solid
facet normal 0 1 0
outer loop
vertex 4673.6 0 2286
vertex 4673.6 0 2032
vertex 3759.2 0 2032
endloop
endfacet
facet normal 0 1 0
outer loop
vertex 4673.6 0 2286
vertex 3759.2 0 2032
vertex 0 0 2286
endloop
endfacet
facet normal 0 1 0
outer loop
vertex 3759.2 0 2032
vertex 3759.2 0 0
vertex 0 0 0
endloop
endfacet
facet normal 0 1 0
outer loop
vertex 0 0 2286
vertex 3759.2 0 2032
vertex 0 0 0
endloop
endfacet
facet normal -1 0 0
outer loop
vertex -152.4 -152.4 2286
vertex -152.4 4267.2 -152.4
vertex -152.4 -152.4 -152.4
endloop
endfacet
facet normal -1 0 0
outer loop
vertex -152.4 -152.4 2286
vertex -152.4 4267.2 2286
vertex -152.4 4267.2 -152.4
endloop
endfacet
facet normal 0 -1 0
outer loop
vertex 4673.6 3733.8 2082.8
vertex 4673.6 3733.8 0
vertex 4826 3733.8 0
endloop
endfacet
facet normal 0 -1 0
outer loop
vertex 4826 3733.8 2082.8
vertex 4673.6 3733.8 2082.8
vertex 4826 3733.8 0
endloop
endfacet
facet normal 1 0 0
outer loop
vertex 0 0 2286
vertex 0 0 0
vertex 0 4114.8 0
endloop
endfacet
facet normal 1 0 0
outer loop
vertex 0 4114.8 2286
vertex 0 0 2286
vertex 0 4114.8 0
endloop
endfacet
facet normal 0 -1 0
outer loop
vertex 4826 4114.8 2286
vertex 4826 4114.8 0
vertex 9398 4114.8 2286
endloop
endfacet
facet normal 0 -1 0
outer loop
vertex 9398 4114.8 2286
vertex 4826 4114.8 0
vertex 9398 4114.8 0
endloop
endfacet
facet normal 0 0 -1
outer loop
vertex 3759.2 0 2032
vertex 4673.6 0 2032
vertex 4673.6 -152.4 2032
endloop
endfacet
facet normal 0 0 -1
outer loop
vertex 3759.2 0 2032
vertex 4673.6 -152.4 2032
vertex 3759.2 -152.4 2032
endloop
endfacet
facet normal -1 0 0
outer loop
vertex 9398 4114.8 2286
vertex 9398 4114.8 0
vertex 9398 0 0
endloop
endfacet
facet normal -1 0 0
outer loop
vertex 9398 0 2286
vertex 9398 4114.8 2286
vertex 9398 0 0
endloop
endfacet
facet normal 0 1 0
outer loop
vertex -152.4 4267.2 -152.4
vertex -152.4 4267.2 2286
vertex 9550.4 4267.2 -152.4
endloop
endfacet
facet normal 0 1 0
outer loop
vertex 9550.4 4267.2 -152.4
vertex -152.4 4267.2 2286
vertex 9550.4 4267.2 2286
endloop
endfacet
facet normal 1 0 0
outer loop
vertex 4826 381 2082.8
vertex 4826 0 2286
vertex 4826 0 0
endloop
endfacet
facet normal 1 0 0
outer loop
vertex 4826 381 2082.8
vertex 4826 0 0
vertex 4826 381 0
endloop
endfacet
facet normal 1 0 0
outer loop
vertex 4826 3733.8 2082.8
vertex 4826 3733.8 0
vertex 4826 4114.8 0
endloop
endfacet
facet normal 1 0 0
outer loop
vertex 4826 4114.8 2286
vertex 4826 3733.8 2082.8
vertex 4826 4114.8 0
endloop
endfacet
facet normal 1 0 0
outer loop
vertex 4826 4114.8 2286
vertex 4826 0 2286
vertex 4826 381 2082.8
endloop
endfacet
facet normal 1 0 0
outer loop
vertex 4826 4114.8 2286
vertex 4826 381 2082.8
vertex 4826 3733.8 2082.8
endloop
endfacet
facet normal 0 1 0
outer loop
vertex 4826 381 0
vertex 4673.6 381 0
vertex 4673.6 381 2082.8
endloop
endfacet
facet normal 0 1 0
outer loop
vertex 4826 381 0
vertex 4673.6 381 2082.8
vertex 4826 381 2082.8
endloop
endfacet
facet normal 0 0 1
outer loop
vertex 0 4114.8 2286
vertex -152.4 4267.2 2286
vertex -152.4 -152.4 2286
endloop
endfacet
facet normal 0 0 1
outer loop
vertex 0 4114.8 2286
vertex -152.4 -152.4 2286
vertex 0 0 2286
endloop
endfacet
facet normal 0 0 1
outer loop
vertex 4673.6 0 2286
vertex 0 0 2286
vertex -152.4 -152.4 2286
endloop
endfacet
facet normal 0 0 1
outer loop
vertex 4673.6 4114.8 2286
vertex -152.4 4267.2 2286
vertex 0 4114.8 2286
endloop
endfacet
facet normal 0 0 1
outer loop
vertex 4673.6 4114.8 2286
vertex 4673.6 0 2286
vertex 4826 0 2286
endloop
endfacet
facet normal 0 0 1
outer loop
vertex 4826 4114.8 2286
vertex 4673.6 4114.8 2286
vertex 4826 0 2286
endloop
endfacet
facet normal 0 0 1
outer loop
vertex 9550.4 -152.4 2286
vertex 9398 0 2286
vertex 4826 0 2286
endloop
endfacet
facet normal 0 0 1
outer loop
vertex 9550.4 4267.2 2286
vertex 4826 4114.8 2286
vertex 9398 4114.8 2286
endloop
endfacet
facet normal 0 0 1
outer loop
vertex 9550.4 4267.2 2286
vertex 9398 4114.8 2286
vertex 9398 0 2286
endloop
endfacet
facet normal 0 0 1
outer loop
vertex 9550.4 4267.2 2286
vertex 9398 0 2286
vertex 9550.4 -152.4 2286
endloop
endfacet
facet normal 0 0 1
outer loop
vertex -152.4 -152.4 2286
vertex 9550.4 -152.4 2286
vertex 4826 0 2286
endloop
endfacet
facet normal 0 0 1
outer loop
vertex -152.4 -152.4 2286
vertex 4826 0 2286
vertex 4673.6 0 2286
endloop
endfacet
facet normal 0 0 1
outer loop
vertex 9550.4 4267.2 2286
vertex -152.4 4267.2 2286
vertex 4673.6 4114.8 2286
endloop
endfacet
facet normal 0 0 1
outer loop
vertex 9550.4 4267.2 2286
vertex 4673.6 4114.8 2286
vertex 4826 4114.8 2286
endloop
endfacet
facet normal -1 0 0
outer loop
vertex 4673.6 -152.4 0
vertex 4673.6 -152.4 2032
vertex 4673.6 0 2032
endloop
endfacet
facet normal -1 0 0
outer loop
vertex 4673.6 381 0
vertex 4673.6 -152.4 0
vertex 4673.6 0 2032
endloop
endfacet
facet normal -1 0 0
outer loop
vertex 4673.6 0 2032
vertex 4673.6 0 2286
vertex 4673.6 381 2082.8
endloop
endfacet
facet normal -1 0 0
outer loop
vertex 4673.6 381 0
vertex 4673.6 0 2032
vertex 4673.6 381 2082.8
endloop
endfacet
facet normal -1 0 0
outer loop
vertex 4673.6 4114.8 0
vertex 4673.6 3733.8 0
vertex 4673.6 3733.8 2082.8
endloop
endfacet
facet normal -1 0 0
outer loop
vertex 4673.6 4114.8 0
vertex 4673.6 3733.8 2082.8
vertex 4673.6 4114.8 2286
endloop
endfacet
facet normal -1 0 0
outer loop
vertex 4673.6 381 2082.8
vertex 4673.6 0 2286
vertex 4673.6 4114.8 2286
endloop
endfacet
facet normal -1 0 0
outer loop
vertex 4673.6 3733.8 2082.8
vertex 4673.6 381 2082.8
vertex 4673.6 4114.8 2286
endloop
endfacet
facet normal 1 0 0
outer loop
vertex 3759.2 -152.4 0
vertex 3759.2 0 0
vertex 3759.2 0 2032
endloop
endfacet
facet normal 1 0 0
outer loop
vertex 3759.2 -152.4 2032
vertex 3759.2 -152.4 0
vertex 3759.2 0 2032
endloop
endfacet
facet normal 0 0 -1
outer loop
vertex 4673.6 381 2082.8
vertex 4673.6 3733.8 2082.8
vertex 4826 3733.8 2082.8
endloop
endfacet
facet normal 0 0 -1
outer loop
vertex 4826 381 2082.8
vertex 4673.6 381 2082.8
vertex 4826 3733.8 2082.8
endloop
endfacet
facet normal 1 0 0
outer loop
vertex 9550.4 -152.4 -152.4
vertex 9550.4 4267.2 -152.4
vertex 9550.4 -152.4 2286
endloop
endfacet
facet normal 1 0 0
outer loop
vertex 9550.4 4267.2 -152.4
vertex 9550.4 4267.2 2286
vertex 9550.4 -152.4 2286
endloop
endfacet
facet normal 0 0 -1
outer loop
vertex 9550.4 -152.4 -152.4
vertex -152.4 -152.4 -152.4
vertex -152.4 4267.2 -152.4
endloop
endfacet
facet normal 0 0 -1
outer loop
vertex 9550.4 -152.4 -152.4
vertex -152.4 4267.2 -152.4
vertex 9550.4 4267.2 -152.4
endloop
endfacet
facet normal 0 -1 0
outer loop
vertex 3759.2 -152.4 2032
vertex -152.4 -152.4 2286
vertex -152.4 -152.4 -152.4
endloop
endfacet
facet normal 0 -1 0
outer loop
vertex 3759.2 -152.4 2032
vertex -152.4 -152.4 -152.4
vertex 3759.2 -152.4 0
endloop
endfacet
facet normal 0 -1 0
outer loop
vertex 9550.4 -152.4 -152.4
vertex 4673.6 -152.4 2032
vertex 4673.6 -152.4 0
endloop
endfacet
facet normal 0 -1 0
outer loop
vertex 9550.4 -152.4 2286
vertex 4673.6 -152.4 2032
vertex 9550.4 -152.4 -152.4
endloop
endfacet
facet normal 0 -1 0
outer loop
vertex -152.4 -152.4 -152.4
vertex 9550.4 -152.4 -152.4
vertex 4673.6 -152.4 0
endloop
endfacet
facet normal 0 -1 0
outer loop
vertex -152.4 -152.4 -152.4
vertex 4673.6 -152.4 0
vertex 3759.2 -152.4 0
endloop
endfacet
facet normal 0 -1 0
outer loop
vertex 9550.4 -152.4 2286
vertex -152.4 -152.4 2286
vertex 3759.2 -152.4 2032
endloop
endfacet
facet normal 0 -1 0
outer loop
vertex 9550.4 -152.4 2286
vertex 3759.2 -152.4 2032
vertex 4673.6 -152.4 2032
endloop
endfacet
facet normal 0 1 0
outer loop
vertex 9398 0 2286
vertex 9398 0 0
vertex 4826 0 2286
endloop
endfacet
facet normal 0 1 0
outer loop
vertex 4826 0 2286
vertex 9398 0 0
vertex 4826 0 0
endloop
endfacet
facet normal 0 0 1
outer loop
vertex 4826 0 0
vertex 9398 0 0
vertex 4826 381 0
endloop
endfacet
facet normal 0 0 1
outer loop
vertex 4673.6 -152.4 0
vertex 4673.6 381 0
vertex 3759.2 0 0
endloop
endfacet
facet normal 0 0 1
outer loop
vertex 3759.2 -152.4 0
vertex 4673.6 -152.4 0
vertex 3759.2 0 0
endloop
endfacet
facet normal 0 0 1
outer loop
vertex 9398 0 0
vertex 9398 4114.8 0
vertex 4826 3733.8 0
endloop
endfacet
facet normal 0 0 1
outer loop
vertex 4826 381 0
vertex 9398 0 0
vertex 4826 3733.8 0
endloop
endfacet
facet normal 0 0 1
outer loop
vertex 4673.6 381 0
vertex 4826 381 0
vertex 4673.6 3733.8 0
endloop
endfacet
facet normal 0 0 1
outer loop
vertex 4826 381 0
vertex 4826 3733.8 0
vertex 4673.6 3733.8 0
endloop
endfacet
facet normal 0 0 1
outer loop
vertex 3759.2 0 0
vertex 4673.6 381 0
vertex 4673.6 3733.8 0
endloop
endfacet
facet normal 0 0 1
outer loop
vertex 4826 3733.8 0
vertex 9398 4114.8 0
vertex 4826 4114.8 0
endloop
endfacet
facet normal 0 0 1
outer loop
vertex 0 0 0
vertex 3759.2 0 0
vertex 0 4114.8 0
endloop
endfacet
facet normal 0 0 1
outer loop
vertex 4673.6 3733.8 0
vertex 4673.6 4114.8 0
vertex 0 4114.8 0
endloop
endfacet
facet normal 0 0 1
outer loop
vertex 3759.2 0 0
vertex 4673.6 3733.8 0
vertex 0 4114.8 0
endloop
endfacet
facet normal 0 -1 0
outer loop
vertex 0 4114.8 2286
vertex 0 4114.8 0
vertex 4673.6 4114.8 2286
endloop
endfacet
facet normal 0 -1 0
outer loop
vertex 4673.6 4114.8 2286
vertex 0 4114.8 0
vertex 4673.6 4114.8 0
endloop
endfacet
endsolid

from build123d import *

# Parameters (mm, degrees)
F0_W     = 9702.8
F0_H     = 4419.6
F0_W_2   = 152.4
F0_H_2   = 381
F1_DEPTH = 2286
F2_W     = 9702.8
F2_H     = 4419.6
F3_DEPTH = 152.4
F4_W     = 914.4
F4_H     = 2032
F5_DEPTH = 152.401
F6_W     = 152.4
F6_H     = 3352.8
F7_DEPTH = 203.2


with BuildPart() as f1:
    # F0 (on Top) → F1 (new body)
    with BuildSketch(Plane.XY):
        with Locations((4699, 2057.4)):
            Rectangle(F0_W, F0_H)
        Polygon((4673.6, 0), (0, 0), (0, 4114.8), (4673.6, 4114.8), (4826, 4114.8), (9398, 4114.8), (9398, 0), (4826, 0), align=None, mode=Mode.SUBTRACT)
        with Locations((4749.8, 3924.3)):
            Rectangle(F0_W_2, F0_H_2)
        with Locations((4749.8, 190.5)):
            Rectangle(F0_W_2, F0_H_2)
    extrude(amount=F1_DEPTH)

    # F2 (on face) → F3 (join)
    with BuildSketch(Plane(origin=(0, 0, 0), x_dir=(1, 0, 0), z_dir=(0, 0, -1))):
        with Locations((4699, -2057.4)):
            Rectangle(F2_W, F2_H)
    extrude(amount=F3_DEPTH)

    # F4 (on face) → F5 (cut, through all)
    with BuildSketch(Plane(origin=(0, 0, 0), x_dir=(-1, 0, 0), z_dir=(0, 1, 0))):
        with Locations((-4216.4, 1016)):
            Rectangle(F4_W, F4_H)
    extrude(amount=-F5_DEPTH, mode=Mode.SUBTRACT)

    # F6 (on face) → F7 (join)
    with BuildSketch(Plane.XY.offset(2286)):
        with Locations((4749.8, 2057.4)):
            Rectangle(F6_W, F6_H)
    extrude(amount=-F7_DEPTH)


solid = f1.part
